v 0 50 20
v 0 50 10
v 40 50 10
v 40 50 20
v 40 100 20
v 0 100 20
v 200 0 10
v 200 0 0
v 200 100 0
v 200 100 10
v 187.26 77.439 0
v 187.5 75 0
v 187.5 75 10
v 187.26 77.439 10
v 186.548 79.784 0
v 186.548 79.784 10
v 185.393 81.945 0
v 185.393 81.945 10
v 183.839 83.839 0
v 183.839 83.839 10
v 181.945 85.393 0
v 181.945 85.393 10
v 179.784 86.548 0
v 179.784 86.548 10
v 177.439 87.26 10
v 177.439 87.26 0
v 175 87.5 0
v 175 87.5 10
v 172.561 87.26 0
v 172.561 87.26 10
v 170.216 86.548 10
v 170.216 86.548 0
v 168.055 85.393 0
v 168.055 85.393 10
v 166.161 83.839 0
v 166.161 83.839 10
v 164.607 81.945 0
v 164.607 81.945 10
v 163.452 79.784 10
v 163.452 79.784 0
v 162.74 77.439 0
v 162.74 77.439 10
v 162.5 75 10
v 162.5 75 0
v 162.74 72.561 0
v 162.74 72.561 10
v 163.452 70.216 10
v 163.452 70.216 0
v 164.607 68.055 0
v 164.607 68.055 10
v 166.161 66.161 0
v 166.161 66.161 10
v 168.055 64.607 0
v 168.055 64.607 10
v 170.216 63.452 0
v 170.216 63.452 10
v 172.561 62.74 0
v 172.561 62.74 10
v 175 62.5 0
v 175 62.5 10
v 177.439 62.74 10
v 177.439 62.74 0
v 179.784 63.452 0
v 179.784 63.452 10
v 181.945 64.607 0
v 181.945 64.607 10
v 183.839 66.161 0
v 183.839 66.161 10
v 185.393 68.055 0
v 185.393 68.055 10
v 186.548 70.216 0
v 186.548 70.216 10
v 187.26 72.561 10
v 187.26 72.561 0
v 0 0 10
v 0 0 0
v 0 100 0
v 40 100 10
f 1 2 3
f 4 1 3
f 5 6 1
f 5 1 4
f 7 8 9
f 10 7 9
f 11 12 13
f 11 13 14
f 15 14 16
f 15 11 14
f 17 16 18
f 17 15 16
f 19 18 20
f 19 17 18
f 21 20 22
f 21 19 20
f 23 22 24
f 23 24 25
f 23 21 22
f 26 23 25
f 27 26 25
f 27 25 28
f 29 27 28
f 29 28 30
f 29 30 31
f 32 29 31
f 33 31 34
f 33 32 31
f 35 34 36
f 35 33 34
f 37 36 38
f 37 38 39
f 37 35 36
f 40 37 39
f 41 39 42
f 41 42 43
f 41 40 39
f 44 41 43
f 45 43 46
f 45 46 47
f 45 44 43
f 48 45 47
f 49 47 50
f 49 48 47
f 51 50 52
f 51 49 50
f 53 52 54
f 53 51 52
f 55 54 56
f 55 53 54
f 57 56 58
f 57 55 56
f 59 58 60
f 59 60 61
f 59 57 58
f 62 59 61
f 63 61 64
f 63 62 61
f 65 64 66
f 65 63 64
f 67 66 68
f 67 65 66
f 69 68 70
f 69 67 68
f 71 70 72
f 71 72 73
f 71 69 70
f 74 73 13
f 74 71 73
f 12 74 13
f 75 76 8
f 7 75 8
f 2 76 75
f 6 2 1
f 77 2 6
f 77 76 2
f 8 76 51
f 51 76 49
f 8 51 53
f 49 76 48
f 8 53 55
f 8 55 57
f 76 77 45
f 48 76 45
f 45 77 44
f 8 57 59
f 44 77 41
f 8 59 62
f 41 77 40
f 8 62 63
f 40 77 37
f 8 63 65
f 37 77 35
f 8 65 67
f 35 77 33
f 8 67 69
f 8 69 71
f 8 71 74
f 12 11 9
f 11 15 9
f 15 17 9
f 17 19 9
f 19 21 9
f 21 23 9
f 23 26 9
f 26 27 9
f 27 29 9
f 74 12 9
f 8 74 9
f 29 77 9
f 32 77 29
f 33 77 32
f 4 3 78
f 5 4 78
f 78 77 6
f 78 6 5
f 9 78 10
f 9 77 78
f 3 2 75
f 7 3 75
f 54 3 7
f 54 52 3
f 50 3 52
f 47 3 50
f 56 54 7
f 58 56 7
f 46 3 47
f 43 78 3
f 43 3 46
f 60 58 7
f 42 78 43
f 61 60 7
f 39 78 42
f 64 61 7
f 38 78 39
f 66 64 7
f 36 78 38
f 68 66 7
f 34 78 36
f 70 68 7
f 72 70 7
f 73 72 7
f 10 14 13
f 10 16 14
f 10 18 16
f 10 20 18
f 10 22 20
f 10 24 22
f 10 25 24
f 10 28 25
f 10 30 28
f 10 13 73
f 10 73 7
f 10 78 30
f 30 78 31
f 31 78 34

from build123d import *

# Parameters (mm, degrees)
CROQUIS2_W              = 200
CROQUIS2_H              = 100
CROQUIS2_R              = 12.5
SALIENTE_EXTRUIR5_DEPTH = 10
CROQUIS11_W             = 40
CROQUIS11_H             = 50
SALIENTE_EXTRUIR6_DEPTH = 10


with BuildPart() as part:
    # Croquis2 → Saliente-Extruir5 (new body)
    with BuildSketch(Plane.XY):
        with Locations((100, 50)):
            Rectangle(CROQUIS2_W, CROQUIS2_H)
        with Locations((175, 75)):
            Circle(CROQUIS2_R, mode=Mode.SUBTRACT)
    extrude(amount=SALIENTE_EXTRUIR5_DEPTH)

    # Croquis11 → Saliente-Extruir6 (add)
    with BuildSketch(Plane.XY.offset(10)):
        with Locations((20, 75)):
            Rectangle(CROQUIS11_W, CROQUIS11_H)
    extrude(amount=SALIENTE_EXTRUIR6_DEPTH)


solid = part.part
